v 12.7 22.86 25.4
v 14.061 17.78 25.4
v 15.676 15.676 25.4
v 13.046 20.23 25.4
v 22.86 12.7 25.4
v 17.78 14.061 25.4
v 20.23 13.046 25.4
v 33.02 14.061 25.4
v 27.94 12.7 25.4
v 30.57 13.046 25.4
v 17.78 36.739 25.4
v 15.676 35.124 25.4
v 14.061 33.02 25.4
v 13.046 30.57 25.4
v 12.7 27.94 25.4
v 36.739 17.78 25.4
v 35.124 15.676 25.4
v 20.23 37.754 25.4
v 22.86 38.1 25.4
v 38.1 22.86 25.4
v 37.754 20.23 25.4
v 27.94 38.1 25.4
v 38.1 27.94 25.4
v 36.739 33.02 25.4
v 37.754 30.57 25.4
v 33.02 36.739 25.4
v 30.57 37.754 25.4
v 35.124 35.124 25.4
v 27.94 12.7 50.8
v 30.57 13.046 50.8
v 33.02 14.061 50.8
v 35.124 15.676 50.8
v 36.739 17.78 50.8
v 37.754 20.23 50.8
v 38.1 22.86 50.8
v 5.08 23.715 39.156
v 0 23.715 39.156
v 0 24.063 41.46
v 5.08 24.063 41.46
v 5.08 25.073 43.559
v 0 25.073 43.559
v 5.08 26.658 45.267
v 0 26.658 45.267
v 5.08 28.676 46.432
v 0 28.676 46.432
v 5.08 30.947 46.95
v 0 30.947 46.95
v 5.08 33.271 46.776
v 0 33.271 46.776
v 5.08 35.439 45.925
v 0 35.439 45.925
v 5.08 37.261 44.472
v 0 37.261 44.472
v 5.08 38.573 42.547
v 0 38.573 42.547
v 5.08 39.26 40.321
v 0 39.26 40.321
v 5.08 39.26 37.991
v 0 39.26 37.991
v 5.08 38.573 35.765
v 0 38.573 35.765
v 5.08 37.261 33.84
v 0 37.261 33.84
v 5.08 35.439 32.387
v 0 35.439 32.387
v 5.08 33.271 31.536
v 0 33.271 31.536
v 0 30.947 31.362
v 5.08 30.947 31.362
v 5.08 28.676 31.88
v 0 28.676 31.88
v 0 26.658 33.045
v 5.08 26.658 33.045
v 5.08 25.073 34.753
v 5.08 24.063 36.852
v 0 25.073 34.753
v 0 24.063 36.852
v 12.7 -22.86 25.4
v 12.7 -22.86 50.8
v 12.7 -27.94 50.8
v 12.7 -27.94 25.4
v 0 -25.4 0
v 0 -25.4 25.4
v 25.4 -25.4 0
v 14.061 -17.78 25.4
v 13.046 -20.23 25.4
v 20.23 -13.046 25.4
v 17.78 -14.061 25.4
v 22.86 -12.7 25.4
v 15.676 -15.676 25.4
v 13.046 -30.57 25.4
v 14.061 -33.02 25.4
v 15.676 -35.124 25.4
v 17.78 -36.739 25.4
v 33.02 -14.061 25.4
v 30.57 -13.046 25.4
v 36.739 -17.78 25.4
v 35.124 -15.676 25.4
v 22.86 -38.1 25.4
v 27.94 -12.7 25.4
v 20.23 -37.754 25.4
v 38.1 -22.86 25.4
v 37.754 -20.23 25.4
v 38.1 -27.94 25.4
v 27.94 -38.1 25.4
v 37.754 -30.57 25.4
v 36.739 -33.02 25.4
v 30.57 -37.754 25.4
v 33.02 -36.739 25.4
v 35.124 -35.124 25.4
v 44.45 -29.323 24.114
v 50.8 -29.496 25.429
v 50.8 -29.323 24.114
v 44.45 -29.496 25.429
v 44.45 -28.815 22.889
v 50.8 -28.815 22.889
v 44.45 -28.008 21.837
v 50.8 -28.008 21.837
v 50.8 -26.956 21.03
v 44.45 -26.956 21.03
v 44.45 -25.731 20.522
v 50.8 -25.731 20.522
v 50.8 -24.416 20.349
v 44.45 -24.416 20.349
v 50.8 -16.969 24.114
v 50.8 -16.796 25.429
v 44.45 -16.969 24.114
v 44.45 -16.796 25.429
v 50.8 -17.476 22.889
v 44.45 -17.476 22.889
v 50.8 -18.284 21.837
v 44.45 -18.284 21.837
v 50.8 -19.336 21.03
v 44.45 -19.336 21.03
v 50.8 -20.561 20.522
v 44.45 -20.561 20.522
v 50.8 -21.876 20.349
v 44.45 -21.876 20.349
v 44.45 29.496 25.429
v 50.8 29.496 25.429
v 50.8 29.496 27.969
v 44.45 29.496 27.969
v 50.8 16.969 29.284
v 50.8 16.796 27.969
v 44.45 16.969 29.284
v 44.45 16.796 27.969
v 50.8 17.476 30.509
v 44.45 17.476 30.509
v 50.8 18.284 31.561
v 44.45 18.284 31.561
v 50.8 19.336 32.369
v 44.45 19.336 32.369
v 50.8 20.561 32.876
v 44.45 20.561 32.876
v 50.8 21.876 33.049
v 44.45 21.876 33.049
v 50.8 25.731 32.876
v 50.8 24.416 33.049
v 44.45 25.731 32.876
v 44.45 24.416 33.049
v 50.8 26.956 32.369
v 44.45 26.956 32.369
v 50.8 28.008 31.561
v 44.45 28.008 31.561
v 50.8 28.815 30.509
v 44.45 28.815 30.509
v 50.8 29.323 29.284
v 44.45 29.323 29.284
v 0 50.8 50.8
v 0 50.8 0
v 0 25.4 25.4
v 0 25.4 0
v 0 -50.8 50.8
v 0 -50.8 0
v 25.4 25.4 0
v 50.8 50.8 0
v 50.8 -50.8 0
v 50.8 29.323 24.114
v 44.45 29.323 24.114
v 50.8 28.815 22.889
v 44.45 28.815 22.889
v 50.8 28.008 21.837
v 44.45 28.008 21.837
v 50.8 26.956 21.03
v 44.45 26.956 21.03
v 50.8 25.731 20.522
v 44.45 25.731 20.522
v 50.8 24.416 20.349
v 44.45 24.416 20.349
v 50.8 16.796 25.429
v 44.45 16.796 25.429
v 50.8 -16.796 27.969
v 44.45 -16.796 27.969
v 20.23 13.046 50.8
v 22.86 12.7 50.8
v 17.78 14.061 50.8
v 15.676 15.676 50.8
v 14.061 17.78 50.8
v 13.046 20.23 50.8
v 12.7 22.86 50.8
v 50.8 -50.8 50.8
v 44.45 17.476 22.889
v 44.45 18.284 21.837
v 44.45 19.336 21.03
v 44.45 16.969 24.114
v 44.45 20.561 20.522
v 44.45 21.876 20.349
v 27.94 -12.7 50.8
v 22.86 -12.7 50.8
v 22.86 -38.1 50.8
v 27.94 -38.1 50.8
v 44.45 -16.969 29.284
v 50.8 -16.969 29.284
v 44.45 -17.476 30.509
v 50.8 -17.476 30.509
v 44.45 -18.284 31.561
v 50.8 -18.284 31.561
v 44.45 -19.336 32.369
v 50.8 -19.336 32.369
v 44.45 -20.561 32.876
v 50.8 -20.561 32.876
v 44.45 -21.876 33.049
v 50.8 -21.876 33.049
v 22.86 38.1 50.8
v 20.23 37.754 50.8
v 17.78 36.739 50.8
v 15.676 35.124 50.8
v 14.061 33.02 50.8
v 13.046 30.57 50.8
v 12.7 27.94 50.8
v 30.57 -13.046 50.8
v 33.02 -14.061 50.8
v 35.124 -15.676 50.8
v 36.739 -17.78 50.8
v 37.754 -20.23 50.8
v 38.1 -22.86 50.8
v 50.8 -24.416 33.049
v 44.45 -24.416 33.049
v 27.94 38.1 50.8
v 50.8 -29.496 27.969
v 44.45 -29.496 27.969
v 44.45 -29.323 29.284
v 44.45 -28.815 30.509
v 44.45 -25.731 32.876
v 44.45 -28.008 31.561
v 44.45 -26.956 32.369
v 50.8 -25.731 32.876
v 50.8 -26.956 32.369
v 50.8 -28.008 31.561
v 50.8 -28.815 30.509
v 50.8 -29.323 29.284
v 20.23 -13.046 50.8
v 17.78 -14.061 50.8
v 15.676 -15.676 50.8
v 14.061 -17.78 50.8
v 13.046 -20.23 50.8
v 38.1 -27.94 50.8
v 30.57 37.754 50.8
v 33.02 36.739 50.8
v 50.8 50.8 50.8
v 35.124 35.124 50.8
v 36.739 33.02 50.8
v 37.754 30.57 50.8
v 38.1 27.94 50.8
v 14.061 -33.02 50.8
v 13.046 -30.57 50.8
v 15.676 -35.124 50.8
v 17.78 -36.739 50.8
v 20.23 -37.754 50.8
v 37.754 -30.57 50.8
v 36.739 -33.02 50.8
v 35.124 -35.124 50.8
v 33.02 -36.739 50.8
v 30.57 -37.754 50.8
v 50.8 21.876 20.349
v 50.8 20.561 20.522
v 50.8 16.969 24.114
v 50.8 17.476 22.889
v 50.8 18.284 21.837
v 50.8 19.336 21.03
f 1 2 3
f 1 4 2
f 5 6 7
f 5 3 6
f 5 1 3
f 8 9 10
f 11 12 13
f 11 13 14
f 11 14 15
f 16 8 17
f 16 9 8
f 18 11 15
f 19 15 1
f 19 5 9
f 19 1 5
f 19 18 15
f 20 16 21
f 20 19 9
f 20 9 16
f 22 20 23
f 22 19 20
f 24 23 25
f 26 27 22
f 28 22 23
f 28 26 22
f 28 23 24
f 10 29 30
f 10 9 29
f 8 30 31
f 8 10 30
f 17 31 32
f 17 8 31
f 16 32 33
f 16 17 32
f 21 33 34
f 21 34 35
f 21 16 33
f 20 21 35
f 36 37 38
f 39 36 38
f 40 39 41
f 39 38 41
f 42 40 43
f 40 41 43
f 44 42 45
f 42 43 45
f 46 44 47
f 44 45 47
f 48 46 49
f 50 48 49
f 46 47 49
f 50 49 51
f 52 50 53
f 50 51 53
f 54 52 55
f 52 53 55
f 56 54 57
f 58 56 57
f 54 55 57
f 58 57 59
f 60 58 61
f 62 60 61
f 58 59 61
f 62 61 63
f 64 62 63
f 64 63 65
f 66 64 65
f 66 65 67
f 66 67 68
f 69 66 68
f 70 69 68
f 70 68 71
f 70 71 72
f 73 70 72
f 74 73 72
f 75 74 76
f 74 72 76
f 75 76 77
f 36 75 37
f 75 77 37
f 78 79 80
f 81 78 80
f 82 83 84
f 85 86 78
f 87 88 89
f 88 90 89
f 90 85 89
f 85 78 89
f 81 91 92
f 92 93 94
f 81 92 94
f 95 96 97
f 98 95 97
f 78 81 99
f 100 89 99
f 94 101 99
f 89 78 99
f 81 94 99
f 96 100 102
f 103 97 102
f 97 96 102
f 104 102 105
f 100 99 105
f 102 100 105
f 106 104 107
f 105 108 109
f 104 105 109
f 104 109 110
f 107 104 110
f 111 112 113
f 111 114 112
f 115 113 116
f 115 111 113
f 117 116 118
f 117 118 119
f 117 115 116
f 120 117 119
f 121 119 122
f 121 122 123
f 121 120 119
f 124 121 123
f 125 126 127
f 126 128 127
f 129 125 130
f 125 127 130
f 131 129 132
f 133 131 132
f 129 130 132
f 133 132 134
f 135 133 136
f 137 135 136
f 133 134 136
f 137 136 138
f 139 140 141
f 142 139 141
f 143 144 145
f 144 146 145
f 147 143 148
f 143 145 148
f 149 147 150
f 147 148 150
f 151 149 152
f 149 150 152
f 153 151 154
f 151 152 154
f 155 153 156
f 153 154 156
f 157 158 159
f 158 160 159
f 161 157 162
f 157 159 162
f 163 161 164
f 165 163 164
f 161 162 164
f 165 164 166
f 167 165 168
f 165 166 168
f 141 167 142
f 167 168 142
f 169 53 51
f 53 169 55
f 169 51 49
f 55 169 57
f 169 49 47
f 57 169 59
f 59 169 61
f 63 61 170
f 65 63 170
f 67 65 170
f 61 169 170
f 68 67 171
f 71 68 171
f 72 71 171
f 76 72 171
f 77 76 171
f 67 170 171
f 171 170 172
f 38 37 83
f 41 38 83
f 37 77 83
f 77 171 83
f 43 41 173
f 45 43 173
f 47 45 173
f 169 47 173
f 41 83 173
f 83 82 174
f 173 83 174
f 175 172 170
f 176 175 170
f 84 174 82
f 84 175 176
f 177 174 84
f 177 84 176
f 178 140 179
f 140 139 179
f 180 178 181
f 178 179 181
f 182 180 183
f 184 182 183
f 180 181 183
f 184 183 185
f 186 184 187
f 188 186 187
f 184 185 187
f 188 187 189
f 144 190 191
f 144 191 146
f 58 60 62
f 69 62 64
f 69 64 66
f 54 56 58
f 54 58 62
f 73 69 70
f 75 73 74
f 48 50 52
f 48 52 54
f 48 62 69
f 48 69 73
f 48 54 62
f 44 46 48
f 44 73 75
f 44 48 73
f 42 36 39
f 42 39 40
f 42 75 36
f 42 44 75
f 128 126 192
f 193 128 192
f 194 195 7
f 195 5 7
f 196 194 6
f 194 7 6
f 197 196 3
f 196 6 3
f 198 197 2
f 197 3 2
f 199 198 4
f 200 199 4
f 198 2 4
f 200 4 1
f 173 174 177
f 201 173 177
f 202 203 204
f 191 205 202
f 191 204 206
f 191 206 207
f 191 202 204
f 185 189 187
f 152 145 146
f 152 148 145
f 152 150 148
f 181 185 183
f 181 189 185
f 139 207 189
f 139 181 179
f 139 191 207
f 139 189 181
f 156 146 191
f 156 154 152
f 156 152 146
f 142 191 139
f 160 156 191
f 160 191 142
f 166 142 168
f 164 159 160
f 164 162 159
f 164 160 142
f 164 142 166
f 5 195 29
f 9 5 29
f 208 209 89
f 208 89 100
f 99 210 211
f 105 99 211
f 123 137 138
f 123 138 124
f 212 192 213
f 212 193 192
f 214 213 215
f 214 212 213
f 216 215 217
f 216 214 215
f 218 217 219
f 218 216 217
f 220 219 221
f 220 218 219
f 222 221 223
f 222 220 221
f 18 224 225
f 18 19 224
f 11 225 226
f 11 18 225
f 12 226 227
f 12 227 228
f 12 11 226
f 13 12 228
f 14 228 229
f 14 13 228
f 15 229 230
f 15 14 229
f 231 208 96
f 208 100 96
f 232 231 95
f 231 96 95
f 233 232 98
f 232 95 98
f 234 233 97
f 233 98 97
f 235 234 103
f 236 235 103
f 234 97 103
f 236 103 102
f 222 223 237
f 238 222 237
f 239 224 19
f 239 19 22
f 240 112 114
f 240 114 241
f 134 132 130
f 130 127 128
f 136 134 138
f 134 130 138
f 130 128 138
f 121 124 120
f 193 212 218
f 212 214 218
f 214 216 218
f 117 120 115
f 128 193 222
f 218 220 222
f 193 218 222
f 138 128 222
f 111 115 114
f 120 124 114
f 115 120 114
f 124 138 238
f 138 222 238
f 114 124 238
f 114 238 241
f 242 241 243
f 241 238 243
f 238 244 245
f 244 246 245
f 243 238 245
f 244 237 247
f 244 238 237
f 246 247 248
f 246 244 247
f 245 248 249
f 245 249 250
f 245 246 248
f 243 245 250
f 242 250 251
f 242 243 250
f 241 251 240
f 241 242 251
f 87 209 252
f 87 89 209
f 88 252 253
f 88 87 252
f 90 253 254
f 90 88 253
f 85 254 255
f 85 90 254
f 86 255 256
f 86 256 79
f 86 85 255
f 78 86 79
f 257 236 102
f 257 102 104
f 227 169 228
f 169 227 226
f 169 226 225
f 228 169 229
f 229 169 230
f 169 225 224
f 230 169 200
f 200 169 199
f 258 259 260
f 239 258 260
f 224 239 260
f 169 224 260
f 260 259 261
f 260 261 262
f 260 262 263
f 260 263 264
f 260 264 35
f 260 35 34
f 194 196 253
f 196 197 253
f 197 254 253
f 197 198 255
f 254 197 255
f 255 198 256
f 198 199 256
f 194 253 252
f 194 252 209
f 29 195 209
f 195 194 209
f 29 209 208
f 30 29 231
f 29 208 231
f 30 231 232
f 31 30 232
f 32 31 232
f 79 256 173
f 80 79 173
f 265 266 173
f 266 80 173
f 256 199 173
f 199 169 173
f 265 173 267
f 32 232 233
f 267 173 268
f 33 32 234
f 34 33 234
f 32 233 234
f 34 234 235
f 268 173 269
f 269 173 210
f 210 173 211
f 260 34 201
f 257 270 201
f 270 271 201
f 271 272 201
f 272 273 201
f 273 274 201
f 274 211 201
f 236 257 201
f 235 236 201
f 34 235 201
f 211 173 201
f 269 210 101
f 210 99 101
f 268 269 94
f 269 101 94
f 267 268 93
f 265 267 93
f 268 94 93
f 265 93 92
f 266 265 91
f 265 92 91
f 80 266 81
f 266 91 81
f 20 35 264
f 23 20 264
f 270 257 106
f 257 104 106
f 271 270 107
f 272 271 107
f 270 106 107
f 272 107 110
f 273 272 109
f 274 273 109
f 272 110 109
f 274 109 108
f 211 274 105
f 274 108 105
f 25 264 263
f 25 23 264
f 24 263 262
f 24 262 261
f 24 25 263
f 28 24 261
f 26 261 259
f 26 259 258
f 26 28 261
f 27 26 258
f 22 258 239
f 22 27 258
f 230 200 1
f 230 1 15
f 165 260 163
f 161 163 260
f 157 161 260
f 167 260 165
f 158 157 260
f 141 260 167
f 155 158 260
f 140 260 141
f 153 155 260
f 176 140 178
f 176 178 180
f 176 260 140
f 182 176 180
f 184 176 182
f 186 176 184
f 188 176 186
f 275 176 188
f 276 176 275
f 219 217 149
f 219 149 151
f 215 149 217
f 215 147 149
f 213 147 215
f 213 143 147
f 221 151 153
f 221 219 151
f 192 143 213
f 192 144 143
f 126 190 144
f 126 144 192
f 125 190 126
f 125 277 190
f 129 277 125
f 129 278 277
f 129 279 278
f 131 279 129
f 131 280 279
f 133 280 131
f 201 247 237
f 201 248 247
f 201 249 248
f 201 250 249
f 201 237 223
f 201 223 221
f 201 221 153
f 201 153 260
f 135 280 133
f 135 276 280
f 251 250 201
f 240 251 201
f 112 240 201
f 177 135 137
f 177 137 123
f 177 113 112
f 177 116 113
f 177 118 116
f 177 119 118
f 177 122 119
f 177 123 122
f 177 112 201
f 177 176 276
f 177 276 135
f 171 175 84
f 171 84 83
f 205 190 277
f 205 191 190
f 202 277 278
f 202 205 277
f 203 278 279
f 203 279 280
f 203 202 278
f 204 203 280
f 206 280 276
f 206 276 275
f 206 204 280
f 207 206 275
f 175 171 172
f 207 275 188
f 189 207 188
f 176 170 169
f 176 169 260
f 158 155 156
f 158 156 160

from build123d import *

# Parameters (mm, degrees)
F0_W      = 50.8
F0_H      = 50.8
F1_DEPTH  = 50.8
F2_W      = 25.4
F2_H      = 25.4
F3_DEPTH  = 25.4
F4_R      = 10.16
F5_W      = 12.7
F5_H      = 12.7
F6_DEPTH  = 6.35
F7_R      = 5.08
F10_DEPTH = 25.4
F13_R     = 7.816063
F14_DEPTH = 5.08


with BuildPart() as f1:
    # F0 (on Top) → F1 (new body)
    with BuildSketch(Plane.XY):
        with Locations((25.4, 25.4)):
            Rectangle(F0_W, F0_H)
    extrude(amount=F1_DEPTH)

    # F2 (on face) → F3 (cut)
    with BuildSketch(Plane.XY.offset(50.8)):
        with Locations((25.4, 25.4)):
            Rectangle(F2_W, F2_H)
    extrude(amount=-F3_DEPTH, mode=Mode.SUBTRACT)

    # F4
    f4_edges = [f1.edges().sort_by_distance(p)[0] for p in [
        (12.7, 38.1, 38.1),
        (38.1, 38.1, 38.1),
        (12.7, 12.7, 38.1),
        (38.1, 12.7, 38.1),
    ]]
    fillet(f4_edges, radius=F4_R)

    # F5 (on face) → F6 (cut)
    with BuildSketch(Plane.YZ.offset(50.8)):
        with Locations((23.145751, 26.69926)):
            Rectangle(F5_W, F5_H)
    extrude(amount=-F6_DEPTH, mode=Mode.SUBTRACT)

    # F7
    f7_edges = [f1.edges().sort_by_distance(p)[0] for p in [
        (47.625, 16.795751, 20.34926),
        (47.625, 16.795751, 33.04926),
        (47.625, 29.495751, 33.04926),
        (47.625, 29.495751, 20.34926),
    ]]
    fillet(f7_edges, radius=F7_R)

    # F9 (on face) → F10 (cut)
    with BuildSketch(Plane.XZ):
        Polygon((0, 25.4), (0, 0), (25.4, 0), align=None)
    extrude(amount=-F10_DEPTH, mode=Mode.SUBTRACT)

    # F12: F1 across face


with BuildPart() as f1_1:
    add(f1.part)
    add(f1.part.mirror(Plane(origin=(27.819048, 0, 27.819048), x_dir=(1, 0, 0), z_dir=(0, -1, 0))))

    # F13 (on face) → F14 (cut)
    with BuildSketch(Plane(origin=(0, 0, 0), x_dir=(0, -1, 0), z_dir=(-1, 0, 0))):
        with Locations((-31.531367, 39.15615)):
            Circle(F13_R)
    extrude(amount=-F14_DEPTH, mode=Mode.SUBTRACT)


solid = f1_1.part
